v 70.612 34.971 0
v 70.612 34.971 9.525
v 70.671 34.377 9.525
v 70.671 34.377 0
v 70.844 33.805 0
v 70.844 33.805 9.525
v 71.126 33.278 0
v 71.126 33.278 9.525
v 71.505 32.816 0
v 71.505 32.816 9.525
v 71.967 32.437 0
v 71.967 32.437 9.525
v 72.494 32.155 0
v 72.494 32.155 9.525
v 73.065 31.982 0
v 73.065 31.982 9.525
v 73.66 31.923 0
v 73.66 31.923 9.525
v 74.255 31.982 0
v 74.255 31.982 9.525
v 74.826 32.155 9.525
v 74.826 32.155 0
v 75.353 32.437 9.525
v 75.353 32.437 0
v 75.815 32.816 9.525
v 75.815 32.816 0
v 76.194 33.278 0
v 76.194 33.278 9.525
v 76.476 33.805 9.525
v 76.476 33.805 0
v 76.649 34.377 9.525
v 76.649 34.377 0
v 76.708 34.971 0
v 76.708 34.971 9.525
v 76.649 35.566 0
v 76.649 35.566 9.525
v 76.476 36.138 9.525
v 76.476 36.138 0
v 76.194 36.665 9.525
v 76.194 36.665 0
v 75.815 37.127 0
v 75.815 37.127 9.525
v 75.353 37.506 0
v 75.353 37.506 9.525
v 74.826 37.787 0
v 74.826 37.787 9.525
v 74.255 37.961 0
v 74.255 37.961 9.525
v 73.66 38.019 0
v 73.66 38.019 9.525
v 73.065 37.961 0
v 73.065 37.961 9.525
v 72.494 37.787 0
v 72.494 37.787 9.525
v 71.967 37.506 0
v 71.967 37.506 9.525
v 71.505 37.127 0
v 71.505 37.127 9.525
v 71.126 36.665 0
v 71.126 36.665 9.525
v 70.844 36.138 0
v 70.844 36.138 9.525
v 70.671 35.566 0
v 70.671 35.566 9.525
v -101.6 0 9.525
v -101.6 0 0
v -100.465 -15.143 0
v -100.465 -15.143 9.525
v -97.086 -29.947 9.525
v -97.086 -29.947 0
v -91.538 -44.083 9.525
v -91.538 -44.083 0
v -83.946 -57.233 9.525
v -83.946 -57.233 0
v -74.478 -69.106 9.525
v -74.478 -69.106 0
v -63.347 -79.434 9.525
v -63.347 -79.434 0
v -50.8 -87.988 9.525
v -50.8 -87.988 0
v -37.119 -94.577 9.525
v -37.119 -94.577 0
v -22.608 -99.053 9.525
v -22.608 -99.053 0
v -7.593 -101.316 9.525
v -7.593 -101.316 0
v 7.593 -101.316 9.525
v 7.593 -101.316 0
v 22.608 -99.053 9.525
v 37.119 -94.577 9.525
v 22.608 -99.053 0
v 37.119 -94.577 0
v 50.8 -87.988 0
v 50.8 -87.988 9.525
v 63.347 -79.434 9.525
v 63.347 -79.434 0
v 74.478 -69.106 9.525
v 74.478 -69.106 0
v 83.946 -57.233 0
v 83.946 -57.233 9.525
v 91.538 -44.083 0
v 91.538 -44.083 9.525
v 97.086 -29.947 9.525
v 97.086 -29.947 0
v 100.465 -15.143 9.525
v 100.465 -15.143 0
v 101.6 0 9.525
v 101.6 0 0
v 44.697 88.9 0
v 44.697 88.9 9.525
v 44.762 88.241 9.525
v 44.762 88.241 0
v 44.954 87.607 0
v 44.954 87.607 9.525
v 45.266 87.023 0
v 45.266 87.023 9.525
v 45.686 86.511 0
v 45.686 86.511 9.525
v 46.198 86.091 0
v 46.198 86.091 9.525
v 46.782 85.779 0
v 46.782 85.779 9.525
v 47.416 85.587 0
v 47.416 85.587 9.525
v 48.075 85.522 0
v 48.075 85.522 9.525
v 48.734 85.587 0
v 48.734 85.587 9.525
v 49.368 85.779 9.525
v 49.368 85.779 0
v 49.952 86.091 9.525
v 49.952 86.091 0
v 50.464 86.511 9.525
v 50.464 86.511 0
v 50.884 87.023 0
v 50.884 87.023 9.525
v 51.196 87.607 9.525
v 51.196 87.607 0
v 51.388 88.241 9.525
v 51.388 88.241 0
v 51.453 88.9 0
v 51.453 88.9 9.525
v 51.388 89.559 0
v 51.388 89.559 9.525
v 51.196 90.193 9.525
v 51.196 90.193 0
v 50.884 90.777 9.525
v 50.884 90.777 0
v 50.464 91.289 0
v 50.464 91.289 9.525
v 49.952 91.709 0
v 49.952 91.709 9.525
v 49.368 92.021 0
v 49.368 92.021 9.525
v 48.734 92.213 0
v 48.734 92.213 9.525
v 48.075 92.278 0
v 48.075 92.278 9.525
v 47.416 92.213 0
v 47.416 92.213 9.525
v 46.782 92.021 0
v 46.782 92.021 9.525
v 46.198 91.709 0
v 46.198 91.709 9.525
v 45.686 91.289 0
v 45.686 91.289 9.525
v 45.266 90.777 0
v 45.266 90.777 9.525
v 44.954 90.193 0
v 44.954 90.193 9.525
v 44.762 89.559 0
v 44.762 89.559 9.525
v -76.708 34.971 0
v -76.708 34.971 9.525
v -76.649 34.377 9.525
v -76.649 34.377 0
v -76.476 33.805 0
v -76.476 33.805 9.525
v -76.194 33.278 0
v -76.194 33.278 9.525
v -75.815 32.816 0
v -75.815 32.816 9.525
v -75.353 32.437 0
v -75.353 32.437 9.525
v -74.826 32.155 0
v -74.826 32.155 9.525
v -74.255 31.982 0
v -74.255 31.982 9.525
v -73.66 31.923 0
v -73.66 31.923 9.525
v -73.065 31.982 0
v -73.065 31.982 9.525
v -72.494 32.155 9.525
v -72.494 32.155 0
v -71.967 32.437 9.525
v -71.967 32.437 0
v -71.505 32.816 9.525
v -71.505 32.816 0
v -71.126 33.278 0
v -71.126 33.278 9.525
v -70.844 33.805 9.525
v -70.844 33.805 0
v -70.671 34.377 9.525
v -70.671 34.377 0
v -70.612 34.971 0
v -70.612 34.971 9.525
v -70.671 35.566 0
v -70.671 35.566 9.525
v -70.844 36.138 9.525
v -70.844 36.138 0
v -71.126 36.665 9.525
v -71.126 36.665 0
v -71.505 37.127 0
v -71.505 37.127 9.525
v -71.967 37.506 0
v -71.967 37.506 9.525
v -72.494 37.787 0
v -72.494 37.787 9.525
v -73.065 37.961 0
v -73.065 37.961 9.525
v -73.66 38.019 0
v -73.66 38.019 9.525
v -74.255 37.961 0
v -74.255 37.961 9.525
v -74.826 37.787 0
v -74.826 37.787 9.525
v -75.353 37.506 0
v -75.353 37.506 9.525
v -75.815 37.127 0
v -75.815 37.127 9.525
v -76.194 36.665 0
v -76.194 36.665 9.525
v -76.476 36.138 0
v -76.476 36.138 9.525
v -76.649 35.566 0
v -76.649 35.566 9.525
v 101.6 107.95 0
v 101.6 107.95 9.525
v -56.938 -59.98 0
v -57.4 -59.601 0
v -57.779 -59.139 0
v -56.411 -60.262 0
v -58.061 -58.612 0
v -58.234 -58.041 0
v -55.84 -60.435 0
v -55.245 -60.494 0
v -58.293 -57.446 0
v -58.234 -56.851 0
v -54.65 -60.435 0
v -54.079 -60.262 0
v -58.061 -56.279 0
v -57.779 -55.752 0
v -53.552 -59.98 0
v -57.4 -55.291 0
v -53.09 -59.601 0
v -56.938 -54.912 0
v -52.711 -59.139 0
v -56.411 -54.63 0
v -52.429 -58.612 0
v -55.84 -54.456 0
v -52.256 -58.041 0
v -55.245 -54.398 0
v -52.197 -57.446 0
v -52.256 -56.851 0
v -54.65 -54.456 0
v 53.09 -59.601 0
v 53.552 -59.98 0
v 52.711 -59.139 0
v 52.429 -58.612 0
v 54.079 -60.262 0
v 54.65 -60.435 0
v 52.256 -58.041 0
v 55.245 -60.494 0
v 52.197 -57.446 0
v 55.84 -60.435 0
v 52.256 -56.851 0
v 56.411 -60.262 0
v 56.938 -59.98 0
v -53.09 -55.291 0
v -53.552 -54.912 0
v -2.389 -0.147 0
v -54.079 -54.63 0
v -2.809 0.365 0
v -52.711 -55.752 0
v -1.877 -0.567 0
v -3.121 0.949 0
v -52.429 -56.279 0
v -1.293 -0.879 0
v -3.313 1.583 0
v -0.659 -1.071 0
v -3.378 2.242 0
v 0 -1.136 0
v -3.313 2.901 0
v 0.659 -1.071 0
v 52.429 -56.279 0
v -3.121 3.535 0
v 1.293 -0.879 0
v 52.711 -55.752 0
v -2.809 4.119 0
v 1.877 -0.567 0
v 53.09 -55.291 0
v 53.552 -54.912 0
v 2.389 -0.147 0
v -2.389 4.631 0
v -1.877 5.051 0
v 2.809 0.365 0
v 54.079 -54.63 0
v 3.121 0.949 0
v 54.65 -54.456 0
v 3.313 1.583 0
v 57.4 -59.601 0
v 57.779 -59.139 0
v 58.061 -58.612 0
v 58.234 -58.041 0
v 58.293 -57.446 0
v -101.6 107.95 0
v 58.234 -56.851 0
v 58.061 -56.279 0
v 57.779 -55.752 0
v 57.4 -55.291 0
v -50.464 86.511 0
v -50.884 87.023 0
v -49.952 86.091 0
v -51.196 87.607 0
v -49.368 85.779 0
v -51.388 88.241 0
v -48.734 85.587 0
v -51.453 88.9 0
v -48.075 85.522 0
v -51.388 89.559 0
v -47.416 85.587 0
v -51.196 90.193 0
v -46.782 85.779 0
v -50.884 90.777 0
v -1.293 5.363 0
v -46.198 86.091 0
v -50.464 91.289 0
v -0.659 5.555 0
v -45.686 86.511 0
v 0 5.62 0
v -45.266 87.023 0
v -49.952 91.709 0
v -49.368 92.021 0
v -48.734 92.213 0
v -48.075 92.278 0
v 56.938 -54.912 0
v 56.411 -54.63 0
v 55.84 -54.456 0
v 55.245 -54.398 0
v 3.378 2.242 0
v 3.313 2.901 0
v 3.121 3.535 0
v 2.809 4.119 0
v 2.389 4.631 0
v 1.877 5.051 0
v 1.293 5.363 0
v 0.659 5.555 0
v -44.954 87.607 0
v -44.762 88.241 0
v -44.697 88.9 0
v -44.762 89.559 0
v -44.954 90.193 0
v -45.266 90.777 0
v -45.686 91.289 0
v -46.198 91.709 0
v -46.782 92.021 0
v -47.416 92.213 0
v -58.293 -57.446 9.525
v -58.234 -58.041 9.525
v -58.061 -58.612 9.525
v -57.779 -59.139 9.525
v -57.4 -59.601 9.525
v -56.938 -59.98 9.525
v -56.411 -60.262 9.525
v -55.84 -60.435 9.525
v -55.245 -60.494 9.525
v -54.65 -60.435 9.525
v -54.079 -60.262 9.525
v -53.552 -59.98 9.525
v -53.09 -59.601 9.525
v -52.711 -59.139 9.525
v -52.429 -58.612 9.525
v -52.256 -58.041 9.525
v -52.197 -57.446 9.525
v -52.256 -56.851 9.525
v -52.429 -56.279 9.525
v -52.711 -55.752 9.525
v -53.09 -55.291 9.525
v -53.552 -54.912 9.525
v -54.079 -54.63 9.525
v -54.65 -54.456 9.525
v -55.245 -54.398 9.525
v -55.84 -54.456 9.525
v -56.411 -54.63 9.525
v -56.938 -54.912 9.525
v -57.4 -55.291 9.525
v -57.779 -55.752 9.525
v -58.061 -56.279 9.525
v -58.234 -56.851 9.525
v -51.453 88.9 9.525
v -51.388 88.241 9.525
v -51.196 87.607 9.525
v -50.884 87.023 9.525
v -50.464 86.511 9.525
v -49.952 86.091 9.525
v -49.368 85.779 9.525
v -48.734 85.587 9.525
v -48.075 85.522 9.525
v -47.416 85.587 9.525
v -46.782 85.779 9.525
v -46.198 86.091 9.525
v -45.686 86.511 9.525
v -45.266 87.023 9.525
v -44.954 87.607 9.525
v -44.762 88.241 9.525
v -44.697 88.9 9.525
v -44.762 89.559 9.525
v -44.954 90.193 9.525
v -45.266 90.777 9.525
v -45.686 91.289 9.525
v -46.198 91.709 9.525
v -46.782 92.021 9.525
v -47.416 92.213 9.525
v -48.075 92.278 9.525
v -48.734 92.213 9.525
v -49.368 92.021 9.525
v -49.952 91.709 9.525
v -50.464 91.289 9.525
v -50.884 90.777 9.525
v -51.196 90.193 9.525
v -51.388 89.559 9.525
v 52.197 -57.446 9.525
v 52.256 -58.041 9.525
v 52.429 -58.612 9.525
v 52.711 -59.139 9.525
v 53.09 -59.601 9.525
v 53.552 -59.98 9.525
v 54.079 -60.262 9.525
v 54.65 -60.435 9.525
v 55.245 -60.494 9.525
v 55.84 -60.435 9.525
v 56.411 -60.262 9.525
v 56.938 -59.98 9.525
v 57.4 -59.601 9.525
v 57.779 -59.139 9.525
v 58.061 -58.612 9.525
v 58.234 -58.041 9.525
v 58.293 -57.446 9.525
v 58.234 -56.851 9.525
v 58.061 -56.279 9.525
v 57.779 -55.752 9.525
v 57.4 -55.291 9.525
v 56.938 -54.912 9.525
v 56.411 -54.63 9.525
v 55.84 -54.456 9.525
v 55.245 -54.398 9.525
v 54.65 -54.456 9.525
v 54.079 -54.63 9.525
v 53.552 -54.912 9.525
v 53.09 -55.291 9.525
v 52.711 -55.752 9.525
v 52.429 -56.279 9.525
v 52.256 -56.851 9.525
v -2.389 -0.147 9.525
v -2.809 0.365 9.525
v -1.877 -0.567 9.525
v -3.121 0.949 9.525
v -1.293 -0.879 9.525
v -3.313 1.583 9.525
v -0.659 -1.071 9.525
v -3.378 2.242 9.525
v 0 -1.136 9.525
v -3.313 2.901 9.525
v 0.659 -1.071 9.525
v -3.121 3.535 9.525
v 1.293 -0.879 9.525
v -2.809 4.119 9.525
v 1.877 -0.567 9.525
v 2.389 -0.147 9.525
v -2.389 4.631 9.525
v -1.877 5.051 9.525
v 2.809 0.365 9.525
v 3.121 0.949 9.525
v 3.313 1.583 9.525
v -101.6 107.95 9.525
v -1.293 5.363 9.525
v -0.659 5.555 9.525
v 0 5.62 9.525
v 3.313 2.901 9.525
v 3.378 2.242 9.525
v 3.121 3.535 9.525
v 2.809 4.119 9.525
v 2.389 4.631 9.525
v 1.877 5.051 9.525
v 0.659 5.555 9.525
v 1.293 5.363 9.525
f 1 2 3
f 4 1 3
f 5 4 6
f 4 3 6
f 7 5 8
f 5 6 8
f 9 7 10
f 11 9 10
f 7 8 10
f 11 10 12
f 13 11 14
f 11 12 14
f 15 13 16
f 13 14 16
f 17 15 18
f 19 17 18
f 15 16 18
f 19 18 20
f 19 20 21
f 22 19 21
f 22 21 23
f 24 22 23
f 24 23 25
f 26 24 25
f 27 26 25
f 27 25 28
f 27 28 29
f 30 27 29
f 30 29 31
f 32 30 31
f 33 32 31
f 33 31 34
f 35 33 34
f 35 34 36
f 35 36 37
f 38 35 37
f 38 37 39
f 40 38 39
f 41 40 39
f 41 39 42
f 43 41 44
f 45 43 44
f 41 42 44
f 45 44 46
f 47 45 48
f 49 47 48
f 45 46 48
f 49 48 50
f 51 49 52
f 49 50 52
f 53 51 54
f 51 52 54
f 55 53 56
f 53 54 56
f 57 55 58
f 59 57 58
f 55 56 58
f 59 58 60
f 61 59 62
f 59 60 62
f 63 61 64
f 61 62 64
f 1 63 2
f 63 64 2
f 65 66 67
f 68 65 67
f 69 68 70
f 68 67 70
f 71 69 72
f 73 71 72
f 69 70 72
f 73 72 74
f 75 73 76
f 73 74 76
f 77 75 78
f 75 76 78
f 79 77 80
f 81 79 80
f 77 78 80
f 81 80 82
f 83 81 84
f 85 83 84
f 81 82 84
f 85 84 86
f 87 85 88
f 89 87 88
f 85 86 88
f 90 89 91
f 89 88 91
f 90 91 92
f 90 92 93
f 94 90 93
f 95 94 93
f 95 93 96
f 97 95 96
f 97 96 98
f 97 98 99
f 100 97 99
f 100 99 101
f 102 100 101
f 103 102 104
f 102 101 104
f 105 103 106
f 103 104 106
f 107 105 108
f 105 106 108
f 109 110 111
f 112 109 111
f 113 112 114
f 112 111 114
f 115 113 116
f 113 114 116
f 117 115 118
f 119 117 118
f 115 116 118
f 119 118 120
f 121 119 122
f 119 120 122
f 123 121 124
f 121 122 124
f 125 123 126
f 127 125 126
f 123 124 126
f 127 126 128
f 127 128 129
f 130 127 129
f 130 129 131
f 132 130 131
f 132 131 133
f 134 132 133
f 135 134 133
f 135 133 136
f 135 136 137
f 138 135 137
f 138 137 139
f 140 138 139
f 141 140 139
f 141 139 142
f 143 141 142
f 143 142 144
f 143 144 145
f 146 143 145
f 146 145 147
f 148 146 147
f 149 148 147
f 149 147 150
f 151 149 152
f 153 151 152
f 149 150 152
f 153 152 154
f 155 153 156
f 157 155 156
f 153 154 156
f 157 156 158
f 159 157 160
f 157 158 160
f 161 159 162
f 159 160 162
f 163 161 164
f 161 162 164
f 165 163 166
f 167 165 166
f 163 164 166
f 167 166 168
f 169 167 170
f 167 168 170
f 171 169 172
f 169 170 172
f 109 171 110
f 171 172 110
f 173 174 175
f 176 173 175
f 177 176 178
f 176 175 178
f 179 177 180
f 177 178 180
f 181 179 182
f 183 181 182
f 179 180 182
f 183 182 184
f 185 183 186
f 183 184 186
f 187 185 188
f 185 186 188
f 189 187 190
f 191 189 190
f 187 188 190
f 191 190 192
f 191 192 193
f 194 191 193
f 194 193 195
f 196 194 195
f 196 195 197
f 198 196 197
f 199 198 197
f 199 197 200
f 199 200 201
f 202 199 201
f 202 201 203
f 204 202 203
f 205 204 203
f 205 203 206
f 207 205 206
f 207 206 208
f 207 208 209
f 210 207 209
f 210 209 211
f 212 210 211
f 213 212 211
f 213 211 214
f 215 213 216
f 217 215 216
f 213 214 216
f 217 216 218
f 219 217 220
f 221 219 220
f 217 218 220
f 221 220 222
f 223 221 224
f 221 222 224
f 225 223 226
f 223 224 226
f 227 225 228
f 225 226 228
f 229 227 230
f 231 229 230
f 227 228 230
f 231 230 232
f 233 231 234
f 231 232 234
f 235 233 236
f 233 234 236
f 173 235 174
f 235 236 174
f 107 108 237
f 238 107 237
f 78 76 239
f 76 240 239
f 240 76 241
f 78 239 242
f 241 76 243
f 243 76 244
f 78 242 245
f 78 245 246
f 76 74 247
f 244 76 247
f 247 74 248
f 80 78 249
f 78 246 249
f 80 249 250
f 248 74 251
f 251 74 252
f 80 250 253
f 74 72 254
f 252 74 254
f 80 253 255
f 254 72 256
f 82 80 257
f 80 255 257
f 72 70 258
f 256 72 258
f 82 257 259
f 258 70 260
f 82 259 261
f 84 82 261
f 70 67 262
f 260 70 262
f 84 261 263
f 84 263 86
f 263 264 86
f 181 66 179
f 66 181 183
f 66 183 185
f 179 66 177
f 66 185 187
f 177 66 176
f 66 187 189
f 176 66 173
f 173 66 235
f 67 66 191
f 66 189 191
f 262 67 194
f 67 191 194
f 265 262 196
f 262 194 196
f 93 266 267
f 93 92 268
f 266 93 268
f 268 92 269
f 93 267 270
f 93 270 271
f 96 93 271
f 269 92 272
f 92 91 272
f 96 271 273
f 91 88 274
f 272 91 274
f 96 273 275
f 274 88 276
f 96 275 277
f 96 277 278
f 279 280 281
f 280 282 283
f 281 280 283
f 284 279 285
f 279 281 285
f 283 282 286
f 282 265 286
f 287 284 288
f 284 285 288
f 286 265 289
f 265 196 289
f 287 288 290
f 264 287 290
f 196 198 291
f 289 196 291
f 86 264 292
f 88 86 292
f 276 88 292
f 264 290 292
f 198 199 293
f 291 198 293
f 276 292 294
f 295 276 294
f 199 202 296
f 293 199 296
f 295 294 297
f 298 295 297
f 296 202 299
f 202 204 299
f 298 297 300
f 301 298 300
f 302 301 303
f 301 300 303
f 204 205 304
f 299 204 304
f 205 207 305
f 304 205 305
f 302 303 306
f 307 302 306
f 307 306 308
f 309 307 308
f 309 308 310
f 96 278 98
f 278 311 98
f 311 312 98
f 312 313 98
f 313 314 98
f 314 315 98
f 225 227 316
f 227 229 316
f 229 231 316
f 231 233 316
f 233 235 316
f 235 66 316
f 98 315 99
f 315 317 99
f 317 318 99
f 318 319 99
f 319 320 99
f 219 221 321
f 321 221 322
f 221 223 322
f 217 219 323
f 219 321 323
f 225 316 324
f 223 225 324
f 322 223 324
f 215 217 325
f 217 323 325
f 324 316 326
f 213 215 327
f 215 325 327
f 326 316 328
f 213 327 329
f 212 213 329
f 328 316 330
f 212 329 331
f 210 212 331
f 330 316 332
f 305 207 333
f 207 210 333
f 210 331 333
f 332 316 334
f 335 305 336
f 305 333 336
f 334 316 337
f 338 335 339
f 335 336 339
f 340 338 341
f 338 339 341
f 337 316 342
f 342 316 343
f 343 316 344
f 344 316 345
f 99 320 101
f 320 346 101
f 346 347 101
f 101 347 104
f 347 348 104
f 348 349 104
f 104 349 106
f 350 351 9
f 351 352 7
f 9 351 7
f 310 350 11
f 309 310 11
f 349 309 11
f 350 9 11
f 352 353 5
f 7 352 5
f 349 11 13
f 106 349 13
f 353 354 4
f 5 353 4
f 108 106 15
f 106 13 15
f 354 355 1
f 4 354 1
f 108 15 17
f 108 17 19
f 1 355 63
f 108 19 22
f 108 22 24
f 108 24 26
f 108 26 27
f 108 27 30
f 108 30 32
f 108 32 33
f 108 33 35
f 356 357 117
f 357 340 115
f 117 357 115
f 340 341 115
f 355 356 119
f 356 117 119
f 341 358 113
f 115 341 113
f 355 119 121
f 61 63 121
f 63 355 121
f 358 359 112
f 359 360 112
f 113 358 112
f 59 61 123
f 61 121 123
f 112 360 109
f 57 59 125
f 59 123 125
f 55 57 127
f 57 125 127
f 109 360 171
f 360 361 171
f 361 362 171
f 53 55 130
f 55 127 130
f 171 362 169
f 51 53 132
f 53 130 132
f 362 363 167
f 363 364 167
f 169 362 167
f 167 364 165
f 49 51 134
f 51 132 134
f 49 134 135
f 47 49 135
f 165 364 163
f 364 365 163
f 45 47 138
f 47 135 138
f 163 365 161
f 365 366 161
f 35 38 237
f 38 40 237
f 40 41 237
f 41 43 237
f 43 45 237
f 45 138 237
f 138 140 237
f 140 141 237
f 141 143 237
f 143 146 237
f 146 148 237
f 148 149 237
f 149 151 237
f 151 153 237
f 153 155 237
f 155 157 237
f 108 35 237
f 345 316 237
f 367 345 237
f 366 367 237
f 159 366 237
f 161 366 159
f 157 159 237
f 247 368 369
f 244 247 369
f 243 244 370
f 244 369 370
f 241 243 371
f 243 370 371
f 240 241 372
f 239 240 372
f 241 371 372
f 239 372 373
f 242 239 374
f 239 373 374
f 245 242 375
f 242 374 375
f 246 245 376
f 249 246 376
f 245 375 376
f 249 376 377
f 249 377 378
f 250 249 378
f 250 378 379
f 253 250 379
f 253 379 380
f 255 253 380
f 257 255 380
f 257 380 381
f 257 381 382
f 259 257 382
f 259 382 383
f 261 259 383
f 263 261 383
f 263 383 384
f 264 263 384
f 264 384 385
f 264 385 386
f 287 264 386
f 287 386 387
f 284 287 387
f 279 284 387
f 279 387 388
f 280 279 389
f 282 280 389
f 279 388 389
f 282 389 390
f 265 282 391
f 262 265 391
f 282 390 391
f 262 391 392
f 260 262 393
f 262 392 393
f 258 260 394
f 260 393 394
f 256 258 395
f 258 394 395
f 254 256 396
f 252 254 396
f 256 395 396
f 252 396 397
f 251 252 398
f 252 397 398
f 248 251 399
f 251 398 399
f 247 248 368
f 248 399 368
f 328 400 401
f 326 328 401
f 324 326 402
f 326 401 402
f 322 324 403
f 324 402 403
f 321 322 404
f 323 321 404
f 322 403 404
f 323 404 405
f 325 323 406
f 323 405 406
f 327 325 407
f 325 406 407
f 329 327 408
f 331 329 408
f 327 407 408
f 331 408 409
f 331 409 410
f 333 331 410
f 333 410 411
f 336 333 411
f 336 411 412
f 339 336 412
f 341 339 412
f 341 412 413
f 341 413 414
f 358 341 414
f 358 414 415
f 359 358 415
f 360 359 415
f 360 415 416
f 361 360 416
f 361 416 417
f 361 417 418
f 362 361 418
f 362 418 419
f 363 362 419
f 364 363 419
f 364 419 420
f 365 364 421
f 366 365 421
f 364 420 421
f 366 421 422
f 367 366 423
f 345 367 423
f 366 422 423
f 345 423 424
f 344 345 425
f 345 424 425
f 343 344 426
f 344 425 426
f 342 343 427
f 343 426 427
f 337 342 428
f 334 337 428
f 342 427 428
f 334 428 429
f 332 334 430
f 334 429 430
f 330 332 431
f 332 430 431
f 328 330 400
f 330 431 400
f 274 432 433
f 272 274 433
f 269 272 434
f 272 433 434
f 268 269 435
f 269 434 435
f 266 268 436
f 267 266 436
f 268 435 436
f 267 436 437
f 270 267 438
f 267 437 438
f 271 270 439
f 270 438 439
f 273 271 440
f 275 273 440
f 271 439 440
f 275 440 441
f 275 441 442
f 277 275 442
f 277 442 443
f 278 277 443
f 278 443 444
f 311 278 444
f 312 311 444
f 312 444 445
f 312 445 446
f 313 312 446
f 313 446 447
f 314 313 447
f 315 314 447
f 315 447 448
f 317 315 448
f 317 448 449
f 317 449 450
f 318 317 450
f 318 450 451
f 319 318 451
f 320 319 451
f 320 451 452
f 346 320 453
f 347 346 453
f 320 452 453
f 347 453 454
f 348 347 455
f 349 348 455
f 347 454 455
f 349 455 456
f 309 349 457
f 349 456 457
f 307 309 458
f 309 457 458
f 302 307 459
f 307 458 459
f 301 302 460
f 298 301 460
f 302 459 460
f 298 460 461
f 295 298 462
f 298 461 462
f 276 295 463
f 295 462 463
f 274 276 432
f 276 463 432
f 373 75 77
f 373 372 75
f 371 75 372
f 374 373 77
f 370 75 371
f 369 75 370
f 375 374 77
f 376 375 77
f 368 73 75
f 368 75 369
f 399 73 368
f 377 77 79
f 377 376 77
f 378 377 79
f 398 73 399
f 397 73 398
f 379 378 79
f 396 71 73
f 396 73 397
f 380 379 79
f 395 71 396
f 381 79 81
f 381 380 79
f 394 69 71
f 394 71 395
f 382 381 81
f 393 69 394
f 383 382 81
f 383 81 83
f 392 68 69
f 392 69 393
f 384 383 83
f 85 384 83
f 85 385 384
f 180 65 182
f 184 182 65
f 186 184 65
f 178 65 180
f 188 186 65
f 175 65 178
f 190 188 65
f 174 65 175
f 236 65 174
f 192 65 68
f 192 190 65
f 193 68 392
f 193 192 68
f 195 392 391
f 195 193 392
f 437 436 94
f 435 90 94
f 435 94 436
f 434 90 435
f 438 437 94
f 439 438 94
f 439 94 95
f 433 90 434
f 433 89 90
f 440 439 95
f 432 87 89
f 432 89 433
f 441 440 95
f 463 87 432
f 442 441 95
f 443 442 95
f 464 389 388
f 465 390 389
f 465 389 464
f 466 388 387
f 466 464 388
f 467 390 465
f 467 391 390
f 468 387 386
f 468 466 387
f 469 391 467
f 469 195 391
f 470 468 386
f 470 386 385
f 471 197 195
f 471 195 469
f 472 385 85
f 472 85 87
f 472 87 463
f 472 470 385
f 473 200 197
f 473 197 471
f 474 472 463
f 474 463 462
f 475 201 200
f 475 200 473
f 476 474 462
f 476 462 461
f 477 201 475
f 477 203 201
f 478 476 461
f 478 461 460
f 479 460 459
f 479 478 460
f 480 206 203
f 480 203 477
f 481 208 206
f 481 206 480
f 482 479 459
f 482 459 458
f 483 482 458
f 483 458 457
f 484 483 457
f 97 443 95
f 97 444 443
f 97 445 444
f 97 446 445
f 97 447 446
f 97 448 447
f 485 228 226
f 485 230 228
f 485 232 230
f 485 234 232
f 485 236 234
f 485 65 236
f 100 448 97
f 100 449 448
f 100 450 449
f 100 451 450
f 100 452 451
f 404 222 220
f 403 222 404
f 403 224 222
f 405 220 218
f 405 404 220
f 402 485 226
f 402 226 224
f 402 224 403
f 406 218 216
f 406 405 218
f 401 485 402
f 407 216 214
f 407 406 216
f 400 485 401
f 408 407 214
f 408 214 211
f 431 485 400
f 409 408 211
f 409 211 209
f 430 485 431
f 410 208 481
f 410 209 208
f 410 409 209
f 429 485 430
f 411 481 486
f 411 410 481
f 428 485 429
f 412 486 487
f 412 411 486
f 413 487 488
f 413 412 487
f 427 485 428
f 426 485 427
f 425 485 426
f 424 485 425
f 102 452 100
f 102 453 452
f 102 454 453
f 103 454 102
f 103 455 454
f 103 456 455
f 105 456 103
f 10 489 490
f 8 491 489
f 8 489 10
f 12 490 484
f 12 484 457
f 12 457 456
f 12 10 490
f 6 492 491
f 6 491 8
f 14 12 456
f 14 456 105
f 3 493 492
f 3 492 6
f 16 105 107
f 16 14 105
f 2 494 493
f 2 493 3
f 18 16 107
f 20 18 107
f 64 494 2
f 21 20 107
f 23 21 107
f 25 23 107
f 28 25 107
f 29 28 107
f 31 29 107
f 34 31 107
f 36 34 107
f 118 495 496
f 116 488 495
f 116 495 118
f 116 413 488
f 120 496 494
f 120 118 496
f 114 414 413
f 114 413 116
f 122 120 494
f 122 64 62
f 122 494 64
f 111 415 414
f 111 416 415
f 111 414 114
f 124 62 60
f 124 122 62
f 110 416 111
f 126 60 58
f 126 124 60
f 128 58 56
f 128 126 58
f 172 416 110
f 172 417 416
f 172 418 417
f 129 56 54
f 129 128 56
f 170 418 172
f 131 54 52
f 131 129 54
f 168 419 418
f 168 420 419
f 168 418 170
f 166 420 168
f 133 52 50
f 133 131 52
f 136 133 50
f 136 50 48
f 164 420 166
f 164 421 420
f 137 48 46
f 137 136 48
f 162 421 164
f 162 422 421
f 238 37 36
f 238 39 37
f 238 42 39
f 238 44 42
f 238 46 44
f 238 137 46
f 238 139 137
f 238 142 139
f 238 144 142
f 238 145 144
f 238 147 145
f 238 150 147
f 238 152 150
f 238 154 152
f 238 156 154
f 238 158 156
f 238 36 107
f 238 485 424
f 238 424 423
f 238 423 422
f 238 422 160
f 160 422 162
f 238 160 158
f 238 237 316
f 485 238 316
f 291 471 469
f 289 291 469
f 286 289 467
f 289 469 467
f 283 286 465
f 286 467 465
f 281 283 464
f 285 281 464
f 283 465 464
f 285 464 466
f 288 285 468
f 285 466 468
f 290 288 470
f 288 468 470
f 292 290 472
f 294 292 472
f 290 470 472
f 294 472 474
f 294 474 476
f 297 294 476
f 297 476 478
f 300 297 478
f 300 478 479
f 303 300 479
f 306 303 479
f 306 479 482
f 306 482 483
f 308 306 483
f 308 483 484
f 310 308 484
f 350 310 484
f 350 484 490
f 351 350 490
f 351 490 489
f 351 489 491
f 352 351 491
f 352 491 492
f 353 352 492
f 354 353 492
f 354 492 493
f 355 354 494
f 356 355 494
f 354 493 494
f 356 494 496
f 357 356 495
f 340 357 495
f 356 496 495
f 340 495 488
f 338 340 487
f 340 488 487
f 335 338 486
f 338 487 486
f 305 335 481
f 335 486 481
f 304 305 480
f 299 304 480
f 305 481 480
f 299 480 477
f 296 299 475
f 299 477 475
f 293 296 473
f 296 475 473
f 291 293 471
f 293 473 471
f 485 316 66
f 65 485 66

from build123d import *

# Parameters (mm, degrees)
F1_DEPTH = 9.525
F2_D     = 6.096
F3_D     = 6.7564


with BuildPart() as f1:
    # F0 (on Top) → F1 (new body)
    with BuildSketch(Plane.XY):
        with BuildLine():
            Line((-101.6, 107.95), (-101.6, 0))
            ThreePointArc((-101.6, 0), (0, -101.6), (101.6, 0))
            Line((101.6, 0), (101.6, 107.95))
            Line((101.6, 107.95), (-101.6, 107.95))
        make_face()
    extrude(amount=F1_DEPTH)

    # F2 (through all)
    with Locations(Plane(origin=(0, 0, 0), x_dir=(1, 0, 0), z_dir=(0, 0, -1))):
        with Locations((-73.66, -34.9713074978), (73.66, -34.9713074978), (-55.245, 57.4458691038), (55.245, 57.4458691038)):
            Hole(F2_D / 2)

    # F3 (through all)
    with Locations(Plane(origin=(0, 0, 0), x_dir=(1, 0, 0), z_dir=(0, 0, -1))):
        with Locations((-48.075, -88.9), (0, -2.2420264777), (48.075, -88.9)):
            Hole(F3_D / 2)


solid = f1.part
